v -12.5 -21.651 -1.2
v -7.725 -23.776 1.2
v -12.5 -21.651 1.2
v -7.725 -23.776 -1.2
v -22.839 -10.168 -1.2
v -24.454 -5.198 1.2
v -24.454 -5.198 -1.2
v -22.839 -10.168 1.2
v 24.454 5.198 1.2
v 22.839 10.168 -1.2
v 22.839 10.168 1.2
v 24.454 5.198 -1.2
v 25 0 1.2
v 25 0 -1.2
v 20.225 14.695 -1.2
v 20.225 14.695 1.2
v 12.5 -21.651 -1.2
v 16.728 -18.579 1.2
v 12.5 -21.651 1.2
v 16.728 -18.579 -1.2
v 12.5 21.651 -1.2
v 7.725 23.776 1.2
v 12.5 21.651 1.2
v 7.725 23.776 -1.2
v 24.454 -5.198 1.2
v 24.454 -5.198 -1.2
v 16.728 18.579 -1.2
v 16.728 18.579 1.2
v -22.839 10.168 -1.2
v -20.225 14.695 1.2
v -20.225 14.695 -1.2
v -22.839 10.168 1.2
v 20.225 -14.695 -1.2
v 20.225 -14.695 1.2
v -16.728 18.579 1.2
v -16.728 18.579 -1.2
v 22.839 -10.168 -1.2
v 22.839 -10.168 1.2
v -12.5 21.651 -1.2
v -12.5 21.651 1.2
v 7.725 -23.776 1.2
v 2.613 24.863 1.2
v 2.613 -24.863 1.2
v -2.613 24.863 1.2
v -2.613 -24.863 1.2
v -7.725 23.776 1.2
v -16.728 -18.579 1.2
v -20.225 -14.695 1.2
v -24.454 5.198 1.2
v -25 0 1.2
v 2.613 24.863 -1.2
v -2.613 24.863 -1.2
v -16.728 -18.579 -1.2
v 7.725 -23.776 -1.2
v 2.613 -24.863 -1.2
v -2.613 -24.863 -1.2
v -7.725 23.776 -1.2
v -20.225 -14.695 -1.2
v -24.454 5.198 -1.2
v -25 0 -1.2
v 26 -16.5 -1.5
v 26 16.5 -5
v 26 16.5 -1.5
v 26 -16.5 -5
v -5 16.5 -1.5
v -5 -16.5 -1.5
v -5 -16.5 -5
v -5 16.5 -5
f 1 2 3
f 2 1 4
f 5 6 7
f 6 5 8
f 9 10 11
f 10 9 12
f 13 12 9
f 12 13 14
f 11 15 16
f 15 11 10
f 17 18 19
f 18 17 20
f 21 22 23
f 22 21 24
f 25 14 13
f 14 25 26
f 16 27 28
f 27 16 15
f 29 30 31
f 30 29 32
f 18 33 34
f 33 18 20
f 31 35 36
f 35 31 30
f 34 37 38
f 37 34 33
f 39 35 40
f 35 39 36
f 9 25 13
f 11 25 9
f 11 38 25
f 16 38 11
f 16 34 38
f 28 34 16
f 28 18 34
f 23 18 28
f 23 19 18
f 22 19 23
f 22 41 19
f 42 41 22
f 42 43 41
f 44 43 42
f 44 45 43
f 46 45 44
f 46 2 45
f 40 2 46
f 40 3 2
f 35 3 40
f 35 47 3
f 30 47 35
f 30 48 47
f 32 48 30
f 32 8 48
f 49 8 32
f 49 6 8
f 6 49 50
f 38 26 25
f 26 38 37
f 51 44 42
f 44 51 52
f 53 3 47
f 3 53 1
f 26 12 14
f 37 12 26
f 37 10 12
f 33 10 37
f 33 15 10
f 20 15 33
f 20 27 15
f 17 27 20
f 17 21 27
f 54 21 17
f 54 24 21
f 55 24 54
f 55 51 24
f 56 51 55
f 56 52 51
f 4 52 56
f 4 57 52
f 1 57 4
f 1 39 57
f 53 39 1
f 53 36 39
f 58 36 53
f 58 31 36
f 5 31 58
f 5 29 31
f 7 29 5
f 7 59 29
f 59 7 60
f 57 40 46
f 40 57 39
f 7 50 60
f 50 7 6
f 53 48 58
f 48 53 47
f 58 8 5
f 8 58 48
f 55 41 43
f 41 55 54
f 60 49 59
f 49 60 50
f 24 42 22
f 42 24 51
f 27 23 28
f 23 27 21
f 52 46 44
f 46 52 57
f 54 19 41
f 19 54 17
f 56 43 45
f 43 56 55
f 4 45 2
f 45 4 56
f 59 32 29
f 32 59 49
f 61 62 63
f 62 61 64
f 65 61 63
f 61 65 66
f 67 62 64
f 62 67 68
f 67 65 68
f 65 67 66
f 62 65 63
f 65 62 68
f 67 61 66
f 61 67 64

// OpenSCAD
module sender(){
    coilRadius = 25;
    coilHeight = 2.4;
    chipLength = 31;
    chipDepth = 33;
    chipHeight = 3.5;
    chip_coil_spacing = 10;
    chipDimensions = [chipLength, chipDepth, chipHeight];
    cylinder(coilHeight, coilRadius, coilRadius, true);
    translate([-5, -16.5, -5]){
        cube(chipDimensions);
    }
}

sender();
